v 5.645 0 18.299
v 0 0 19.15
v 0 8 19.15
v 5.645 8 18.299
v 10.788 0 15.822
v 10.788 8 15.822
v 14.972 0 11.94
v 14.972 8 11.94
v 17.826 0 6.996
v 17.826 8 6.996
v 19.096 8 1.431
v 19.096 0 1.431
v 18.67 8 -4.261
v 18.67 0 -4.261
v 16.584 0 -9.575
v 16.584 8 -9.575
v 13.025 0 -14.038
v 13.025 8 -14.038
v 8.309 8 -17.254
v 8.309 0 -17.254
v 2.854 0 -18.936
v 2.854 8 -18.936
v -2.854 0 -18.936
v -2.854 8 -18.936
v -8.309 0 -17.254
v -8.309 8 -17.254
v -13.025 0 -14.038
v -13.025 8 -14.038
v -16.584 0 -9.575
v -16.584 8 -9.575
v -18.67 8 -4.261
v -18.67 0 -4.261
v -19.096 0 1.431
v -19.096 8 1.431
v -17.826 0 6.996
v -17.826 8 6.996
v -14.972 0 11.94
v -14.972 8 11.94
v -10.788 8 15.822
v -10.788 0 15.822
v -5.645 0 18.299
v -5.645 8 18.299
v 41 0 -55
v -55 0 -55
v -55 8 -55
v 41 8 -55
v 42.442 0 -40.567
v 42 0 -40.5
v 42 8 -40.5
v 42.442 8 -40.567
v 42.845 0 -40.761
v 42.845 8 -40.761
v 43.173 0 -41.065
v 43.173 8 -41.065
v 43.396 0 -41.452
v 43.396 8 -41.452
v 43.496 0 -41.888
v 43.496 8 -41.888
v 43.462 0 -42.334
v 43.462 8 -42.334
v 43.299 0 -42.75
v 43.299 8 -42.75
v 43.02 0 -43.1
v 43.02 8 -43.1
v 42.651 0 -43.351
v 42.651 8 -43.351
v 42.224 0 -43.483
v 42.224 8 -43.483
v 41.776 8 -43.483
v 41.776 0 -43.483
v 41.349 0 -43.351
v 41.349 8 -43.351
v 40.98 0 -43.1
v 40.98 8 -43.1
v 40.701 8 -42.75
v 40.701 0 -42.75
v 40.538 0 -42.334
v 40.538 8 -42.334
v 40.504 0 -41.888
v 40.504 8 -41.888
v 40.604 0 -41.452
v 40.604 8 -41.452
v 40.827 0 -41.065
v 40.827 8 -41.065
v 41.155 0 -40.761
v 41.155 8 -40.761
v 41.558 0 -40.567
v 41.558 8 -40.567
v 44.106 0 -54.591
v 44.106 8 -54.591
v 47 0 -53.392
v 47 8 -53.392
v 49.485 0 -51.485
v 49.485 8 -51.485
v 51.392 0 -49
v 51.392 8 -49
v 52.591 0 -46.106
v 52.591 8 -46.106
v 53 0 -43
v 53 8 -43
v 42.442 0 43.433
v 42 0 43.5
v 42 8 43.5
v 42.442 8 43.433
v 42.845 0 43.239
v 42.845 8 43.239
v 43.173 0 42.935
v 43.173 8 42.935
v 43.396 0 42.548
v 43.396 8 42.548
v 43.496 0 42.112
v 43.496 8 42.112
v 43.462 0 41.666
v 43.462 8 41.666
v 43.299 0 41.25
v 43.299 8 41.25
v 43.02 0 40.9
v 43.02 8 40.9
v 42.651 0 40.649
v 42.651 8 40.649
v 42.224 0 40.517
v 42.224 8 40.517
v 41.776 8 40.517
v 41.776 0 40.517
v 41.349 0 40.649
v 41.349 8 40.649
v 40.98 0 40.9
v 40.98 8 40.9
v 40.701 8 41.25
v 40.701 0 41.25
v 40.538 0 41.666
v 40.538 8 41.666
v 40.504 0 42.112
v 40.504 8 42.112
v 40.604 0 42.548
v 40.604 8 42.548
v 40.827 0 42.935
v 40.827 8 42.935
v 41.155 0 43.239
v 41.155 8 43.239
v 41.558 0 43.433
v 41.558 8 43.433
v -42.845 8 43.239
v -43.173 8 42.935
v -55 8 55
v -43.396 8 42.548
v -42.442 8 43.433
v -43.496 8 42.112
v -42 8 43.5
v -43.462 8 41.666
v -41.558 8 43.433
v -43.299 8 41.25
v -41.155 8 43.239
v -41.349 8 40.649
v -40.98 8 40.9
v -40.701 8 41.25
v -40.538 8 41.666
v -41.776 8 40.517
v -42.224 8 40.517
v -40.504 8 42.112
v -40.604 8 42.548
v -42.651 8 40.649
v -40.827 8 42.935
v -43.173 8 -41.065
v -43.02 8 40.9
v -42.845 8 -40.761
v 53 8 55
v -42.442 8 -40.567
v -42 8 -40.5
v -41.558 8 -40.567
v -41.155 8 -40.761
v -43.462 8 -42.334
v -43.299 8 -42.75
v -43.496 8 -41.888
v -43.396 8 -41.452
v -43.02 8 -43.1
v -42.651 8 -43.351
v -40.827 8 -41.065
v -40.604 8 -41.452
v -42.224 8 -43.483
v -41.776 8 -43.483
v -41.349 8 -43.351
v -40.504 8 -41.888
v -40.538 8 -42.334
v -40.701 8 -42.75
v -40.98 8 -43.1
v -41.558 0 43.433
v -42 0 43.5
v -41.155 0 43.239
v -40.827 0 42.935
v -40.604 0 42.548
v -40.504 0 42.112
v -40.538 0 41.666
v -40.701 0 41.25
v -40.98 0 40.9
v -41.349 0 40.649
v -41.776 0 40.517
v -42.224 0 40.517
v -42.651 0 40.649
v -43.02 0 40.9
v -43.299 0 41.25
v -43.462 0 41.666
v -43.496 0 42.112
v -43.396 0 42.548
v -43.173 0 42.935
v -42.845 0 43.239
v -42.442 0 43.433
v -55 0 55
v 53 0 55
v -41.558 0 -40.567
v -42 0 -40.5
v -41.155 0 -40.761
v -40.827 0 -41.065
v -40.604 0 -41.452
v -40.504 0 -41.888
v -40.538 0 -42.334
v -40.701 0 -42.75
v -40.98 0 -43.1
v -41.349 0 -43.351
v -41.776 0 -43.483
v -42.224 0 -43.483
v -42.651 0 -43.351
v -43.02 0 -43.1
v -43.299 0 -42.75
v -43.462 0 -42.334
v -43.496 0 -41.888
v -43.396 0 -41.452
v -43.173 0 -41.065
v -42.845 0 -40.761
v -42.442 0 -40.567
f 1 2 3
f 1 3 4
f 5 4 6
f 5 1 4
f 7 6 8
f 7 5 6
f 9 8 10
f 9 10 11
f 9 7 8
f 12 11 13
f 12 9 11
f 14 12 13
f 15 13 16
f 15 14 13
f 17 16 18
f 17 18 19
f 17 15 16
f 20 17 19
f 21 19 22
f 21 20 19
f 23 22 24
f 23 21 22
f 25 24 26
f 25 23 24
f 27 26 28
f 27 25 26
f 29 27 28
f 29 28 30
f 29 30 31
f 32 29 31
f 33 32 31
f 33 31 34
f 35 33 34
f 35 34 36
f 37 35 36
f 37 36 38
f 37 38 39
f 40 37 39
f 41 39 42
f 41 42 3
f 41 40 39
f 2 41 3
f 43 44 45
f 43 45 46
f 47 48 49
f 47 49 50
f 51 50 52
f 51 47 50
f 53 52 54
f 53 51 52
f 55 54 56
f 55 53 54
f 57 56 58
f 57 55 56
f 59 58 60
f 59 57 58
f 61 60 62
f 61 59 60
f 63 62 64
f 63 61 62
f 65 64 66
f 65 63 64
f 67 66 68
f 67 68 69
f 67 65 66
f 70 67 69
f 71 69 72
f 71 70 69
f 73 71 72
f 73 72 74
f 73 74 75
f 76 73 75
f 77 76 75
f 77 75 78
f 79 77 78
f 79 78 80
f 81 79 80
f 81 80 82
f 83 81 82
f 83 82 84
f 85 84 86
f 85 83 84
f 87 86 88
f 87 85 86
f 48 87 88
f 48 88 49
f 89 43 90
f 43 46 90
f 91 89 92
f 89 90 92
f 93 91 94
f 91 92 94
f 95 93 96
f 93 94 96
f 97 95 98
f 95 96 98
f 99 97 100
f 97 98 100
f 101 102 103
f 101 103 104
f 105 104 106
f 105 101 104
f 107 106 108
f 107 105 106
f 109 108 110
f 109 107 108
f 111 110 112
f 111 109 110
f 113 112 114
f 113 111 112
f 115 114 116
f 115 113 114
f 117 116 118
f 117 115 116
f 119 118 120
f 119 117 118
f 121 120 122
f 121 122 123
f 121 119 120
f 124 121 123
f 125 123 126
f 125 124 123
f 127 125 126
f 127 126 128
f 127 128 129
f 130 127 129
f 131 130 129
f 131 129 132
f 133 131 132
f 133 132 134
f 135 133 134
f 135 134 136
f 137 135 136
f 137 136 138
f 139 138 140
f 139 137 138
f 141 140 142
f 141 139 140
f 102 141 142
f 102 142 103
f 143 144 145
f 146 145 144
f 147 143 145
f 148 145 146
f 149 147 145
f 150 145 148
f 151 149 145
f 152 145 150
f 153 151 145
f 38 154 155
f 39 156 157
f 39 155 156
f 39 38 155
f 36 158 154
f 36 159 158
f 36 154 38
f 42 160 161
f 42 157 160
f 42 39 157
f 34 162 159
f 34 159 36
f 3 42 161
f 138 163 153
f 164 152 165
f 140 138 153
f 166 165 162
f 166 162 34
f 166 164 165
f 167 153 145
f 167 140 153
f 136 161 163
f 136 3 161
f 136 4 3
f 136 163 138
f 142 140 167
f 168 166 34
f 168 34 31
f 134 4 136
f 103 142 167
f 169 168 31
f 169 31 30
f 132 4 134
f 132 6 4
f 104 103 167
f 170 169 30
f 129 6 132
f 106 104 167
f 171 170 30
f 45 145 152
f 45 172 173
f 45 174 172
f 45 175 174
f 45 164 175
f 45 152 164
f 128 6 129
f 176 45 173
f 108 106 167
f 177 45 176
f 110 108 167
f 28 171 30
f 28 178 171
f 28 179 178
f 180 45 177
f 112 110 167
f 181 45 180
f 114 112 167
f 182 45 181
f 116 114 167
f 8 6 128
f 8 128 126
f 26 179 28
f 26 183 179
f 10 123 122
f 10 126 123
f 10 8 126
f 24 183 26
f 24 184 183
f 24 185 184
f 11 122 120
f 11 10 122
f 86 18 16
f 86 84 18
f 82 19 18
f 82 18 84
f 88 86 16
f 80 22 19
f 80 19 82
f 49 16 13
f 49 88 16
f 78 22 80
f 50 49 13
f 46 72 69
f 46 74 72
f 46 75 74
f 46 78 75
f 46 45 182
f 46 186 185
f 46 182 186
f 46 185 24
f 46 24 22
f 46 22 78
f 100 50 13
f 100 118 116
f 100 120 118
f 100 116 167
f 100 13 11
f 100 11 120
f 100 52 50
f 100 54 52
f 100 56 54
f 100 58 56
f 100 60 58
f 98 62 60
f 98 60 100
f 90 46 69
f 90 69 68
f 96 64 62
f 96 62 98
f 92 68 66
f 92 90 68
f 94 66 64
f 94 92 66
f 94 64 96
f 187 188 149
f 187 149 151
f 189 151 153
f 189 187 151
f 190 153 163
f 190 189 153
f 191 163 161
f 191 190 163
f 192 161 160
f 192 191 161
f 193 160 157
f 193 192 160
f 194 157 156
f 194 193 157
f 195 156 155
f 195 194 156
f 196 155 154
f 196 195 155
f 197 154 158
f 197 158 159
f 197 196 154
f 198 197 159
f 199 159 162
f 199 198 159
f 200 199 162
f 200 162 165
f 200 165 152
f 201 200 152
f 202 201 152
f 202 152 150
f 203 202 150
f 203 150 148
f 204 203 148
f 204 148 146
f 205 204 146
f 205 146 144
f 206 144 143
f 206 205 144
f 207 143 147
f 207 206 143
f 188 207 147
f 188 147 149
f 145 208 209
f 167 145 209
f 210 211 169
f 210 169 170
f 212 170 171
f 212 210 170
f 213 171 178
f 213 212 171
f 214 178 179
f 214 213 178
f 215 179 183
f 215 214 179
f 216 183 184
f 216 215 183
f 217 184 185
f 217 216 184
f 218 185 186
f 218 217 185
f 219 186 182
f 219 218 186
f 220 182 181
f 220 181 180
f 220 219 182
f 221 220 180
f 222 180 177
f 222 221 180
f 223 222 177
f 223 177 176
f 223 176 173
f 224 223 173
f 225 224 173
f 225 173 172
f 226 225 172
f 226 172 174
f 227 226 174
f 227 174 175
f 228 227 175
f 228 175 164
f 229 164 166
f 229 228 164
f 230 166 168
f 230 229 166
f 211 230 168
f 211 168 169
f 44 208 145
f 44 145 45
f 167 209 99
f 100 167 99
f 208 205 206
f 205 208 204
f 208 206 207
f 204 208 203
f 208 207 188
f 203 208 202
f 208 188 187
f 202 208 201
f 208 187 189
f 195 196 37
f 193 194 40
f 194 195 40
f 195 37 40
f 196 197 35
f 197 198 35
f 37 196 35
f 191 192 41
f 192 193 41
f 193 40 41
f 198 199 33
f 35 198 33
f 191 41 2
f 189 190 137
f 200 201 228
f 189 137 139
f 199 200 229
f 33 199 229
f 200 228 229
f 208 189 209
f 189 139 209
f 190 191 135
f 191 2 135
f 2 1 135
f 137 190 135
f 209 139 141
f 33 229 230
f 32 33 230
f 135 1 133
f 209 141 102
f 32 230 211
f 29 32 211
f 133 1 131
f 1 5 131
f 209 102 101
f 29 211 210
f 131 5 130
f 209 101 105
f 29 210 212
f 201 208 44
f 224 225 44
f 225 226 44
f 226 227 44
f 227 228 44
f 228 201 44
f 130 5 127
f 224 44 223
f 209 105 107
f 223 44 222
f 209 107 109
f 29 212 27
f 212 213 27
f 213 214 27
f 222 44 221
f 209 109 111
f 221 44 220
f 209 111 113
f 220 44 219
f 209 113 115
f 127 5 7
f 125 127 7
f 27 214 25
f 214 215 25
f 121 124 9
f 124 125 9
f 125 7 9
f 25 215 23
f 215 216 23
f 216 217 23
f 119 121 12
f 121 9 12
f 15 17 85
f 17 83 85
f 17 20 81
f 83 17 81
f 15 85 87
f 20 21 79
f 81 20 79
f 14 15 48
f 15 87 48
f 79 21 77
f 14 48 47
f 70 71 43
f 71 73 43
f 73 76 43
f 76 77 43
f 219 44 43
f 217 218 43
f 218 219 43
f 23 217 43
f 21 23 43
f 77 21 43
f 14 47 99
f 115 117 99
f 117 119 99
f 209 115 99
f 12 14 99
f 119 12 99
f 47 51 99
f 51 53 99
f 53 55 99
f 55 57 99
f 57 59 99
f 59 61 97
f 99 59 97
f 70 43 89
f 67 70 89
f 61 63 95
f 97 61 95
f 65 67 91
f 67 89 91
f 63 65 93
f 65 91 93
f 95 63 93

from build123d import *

# Parameters (mm, degrees)
SKETCH1_W           = 108
SKETCH1_H           = 110
SKETCH1_R           = 19.15
SKETCH1_R_2         = 1.5
BOSS_EXTRUDE1_DEPTH = 8
FILLET1_R           = 12


with BuildPart() as part:
    # Sketch1 → Boss-Extrude1 (new body)
    with BuildSketch(Plane(origin=(0, 0, 0), x_dir=(1, 0, 0), z_dir=(0, 1, 0))):
        with Locations((-1, 0)):
            Rectangle(SKETCH1_W, SKETCH1_H)
        with Locations(Location((0, 0, 0), (0, 0, 270))):
            Circle(SKETCH1_R, mode=Mode.SUBTRACT)
        with Locations(Location((-42, 42, 0), (0, 0, 270))):
            Circle(SKETCH1_R_2, mode=Mode.SUBTRACT)
        with Locations(Location((42, 42, 0), (0, 0, 270))):
            Circle(SKETCH1_R_2, mode=Mode.SUBTRACT)
        with Locations(Location((42, -42, 0), (0, 0, 270))):
            Circle(SKETCH1_R_2, mode=Mode.SUBTRACT)
        with Locations(Location((-42, -42, 0), (0, 0, 270))):
            Circle(SKETCH1_R_2, mode=Mode.SUBTRACT)
    extrude(amount=BOSS_EXTRUDE1_DEPTH)

    # Fillet1
    fillet1_edges = [part.edges().sort_by_distance(p)[0] for p in [
        (53, 4, -55),
    ]]
    fillet(fillet1_edges, radius=FILLET1_R)


solid = part.part
